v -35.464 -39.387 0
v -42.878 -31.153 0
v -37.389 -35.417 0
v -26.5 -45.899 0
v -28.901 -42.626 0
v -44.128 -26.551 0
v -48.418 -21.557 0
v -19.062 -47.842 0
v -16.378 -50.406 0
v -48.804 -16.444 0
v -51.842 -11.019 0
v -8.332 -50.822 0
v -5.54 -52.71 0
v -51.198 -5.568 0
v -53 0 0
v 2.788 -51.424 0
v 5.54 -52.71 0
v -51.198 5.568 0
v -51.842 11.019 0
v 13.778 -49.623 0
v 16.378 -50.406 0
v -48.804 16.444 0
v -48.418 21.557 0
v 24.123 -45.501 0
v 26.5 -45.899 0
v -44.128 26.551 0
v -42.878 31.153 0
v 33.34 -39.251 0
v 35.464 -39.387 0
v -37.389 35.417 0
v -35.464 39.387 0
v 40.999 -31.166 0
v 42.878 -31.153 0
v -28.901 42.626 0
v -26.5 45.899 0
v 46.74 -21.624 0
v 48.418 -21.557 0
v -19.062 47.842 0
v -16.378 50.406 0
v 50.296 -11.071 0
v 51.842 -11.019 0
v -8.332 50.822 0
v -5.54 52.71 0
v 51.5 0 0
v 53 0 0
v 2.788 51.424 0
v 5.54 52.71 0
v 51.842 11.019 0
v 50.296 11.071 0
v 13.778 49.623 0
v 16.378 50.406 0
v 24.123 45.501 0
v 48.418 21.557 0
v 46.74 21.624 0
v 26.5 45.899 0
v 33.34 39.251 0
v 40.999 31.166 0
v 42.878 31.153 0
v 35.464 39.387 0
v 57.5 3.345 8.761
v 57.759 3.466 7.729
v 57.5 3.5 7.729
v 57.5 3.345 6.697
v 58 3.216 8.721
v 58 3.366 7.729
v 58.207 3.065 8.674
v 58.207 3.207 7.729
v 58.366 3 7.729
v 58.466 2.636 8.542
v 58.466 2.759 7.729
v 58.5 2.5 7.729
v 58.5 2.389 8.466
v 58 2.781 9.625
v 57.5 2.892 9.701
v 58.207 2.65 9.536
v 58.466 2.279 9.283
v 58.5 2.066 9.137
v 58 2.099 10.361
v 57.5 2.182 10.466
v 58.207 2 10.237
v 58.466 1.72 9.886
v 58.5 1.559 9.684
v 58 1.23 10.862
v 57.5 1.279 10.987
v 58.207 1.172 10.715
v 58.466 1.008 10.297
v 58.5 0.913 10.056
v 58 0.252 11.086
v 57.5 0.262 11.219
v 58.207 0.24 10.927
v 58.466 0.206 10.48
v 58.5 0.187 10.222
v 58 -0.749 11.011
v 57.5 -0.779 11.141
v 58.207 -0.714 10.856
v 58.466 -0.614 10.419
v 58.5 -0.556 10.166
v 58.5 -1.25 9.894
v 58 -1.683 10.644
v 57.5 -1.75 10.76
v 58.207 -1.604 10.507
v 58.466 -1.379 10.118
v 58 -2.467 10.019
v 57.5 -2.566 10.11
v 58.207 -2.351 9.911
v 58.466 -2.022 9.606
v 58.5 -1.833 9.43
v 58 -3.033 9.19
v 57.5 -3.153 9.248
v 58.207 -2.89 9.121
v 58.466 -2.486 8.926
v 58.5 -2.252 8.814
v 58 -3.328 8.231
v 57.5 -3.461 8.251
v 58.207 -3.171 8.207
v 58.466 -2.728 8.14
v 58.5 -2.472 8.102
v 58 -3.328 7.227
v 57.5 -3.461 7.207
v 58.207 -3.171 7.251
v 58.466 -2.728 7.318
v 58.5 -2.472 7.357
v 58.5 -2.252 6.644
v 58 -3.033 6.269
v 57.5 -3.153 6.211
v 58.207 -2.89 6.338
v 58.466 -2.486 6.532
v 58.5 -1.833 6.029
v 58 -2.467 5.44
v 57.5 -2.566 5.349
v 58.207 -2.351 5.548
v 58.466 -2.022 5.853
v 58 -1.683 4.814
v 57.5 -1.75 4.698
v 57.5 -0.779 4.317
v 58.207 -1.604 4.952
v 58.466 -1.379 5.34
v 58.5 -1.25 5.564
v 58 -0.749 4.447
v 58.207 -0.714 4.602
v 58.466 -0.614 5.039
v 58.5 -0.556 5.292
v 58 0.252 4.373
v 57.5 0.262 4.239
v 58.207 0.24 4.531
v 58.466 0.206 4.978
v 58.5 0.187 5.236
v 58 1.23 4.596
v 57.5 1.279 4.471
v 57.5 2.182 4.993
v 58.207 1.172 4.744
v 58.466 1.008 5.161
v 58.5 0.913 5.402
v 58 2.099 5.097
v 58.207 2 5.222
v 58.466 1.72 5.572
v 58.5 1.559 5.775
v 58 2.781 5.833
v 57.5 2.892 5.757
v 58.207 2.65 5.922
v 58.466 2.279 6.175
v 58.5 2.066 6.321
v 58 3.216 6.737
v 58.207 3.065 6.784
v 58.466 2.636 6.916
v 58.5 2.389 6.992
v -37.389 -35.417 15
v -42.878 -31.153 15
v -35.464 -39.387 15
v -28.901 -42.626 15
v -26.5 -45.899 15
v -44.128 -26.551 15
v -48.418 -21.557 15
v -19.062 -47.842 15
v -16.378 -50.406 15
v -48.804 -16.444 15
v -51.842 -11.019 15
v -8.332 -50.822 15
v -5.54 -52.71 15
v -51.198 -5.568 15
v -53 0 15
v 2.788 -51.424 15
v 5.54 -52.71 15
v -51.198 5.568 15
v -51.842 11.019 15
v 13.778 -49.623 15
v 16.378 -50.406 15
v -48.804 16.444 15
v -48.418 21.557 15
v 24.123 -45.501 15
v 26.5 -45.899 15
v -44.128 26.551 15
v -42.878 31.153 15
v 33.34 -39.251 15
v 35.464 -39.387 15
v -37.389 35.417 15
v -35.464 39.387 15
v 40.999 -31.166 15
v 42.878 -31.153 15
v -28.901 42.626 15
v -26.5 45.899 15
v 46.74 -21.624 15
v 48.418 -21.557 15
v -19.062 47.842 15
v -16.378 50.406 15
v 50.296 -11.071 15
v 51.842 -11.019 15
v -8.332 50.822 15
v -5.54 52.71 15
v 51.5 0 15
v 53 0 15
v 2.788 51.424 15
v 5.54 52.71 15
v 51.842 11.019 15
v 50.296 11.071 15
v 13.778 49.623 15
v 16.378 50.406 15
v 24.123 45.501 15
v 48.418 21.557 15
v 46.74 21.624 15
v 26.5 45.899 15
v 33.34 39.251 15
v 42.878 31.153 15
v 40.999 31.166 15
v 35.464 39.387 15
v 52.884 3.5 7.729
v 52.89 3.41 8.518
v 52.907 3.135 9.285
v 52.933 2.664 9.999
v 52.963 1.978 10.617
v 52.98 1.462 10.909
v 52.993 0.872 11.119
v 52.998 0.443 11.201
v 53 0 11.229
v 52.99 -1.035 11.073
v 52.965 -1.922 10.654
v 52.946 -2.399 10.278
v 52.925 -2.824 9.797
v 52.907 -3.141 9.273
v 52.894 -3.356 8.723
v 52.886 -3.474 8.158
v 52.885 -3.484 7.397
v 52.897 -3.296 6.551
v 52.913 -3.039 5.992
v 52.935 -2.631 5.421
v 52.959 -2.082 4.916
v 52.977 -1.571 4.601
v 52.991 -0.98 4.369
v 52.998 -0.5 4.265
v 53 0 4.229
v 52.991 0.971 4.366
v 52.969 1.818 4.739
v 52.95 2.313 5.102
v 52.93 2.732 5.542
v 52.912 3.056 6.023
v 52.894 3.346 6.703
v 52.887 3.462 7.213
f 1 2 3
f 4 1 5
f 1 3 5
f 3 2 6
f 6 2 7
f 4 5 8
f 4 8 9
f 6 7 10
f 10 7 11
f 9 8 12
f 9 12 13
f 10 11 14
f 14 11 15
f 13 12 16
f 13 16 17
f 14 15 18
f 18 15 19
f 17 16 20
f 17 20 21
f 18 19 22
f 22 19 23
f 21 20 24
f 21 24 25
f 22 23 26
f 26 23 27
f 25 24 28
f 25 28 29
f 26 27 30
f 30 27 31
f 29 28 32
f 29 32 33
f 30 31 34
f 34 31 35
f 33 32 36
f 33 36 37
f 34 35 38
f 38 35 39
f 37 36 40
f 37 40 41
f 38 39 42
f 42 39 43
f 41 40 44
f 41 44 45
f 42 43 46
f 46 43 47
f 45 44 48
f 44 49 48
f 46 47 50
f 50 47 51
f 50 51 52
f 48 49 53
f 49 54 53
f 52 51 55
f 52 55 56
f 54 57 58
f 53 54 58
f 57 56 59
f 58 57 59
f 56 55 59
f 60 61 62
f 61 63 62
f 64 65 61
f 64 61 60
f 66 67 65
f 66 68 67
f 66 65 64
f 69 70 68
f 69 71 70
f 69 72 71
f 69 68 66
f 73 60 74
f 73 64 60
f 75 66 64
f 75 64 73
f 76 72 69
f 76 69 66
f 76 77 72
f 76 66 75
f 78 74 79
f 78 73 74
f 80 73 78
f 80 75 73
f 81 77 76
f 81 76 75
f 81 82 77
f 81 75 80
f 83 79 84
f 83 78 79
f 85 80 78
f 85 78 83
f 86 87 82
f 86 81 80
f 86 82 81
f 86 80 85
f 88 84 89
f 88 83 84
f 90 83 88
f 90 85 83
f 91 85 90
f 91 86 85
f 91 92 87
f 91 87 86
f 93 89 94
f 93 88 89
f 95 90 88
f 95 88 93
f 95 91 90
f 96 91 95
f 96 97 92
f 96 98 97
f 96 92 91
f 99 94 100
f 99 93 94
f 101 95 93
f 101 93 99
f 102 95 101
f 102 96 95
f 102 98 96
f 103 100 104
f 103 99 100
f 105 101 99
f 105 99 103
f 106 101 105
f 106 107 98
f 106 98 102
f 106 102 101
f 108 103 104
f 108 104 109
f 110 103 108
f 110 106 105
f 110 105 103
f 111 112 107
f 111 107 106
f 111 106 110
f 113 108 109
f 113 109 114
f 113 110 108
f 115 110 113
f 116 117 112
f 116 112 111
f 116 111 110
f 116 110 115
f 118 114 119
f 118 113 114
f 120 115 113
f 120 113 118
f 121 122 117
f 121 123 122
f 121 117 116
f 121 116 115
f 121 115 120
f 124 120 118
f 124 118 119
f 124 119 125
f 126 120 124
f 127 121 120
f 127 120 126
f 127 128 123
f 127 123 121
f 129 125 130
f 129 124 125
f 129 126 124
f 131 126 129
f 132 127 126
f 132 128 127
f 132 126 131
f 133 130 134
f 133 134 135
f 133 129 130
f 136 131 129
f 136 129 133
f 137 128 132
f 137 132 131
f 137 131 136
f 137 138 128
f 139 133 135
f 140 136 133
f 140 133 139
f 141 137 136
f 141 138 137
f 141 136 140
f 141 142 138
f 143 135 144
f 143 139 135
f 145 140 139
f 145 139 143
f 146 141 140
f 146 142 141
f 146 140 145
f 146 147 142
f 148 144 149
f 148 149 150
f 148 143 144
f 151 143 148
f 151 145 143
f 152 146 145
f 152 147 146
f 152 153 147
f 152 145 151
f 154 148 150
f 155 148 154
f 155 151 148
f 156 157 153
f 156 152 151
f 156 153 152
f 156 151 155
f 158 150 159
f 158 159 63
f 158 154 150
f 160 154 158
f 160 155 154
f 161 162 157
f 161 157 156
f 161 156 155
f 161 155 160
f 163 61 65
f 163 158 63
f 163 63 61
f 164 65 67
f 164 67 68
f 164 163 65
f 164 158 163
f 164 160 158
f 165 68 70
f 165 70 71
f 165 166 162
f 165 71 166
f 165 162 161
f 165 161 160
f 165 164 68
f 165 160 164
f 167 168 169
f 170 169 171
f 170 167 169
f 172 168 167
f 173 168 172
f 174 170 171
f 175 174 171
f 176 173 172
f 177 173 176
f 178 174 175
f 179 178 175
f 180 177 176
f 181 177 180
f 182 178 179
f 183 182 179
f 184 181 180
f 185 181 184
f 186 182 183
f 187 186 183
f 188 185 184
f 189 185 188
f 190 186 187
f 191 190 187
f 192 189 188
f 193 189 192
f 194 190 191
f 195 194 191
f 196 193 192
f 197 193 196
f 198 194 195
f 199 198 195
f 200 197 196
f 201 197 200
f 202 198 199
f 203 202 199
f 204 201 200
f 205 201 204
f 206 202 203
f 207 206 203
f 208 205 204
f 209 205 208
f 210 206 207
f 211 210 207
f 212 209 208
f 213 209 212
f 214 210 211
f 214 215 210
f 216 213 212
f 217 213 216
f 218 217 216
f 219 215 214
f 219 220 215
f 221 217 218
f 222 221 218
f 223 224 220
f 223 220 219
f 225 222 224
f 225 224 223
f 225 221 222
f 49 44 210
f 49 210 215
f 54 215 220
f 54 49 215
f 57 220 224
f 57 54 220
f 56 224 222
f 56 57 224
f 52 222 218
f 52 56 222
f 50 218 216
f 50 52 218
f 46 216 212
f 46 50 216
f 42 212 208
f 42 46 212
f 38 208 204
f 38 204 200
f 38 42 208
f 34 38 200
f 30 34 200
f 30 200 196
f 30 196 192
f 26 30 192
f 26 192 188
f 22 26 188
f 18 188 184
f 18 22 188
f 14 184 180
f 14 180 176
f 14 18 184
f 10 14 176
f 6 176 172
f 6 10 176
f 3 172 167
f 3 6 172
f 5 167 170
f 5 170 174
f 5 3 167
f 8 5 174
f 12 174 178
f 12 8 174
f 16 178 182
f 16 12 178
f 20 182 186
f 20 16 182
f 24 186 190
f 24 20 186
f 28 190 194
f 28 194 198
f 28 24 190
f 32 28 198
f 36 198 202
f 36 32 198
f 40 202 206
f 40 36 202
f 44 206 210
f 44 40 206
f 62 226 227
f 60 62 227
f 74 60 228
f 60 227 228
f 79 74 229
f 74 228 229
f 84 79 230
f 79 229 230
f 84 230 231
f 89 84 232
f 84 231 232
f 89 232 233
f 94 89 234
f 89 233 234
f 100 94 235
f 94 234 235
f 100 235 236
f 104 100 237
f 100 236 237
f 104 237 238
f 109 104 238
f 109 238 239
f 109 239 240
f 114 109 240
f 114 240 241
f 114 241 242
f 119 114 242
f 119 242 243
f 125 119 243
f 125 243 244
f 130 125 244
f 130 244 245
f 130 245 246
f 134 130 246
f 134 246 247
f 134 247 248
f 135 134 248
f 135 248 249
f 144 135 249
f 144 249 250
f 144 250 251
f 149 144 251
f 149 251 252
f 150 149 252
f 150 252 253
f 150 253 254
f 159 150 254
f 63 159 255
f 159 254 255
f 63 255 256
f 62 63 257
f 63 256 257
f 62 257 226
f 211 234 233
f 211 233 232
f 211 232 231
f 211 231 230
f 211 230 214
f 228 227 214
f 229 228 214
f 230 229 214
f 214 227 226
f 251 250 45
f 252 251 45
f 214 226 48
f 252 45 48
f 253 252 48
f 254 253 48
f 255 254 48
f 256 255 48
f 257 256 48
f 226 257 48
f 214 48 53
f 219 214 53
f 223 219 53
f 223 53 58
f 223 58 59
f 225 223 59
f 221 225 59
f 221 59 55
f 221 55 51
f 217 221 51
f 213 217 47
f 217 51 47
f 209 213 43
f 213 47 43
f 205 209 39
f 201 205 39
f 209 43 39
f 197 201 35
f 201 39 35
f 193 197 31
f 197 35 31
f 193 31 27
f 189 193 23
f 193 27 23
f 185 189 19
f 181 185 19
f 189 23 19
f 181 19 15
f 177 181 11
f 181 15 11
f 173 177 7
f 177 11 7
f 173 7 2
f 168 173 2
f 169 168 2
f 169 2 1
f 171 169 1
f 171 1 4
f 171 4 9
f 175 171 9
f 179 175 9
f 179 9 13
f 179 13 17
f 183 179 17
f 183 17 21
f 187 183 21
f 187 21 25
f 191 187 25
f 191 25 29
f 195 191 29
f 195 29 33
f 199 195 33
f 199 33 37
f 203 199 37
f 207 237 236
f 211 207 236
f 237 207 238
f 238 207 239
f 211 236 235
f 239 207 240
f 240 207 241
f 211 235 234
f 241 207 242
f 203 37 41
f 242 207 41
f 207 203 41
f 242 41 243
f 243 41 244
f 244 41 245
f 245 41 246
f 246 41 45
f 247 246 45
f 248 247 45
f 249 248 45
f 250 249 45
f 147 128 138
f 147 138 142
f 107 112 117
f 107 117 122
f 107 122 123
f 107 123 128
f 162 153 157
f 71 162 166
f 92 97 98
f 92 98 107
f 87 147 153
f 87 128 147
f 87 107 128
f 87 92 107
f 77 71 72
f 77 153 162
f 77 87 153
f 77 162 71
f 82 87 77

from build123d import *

# Parameters (mm, degrees)
F0_R     = 53
F0_R_2   = 51.5
F1_DEPTH = 15
F3_R     = 3.5
F4_DEPTH = 7
F5_R     = 1


with BuildPart() as f1:
    # F0 (on Top) → F1 (new body)
    with BuildSketch(Plane.XY):
        Circle(F0_R)
        Circle(F0_R_2, mode=Mode.SUBTRACT)
    extrude(amount=F1_DEPTH)

    # F3 (on offset) → F4 (join)
    with BuildSketch(Plane.YZ.offset(51.5)):
        with Locations((0, 7.729115)):
            Circle(F3_R)
    extrude(amount=F4_DEPTH)

    # F5
    f5_edges = [f1.edges().sort_by_distance(p)[0] for p in [
        (58.5, -3.5, 7.729115),
    ]]
    fillet(f5_edges, radius=F5_R)


solid = f1.part
